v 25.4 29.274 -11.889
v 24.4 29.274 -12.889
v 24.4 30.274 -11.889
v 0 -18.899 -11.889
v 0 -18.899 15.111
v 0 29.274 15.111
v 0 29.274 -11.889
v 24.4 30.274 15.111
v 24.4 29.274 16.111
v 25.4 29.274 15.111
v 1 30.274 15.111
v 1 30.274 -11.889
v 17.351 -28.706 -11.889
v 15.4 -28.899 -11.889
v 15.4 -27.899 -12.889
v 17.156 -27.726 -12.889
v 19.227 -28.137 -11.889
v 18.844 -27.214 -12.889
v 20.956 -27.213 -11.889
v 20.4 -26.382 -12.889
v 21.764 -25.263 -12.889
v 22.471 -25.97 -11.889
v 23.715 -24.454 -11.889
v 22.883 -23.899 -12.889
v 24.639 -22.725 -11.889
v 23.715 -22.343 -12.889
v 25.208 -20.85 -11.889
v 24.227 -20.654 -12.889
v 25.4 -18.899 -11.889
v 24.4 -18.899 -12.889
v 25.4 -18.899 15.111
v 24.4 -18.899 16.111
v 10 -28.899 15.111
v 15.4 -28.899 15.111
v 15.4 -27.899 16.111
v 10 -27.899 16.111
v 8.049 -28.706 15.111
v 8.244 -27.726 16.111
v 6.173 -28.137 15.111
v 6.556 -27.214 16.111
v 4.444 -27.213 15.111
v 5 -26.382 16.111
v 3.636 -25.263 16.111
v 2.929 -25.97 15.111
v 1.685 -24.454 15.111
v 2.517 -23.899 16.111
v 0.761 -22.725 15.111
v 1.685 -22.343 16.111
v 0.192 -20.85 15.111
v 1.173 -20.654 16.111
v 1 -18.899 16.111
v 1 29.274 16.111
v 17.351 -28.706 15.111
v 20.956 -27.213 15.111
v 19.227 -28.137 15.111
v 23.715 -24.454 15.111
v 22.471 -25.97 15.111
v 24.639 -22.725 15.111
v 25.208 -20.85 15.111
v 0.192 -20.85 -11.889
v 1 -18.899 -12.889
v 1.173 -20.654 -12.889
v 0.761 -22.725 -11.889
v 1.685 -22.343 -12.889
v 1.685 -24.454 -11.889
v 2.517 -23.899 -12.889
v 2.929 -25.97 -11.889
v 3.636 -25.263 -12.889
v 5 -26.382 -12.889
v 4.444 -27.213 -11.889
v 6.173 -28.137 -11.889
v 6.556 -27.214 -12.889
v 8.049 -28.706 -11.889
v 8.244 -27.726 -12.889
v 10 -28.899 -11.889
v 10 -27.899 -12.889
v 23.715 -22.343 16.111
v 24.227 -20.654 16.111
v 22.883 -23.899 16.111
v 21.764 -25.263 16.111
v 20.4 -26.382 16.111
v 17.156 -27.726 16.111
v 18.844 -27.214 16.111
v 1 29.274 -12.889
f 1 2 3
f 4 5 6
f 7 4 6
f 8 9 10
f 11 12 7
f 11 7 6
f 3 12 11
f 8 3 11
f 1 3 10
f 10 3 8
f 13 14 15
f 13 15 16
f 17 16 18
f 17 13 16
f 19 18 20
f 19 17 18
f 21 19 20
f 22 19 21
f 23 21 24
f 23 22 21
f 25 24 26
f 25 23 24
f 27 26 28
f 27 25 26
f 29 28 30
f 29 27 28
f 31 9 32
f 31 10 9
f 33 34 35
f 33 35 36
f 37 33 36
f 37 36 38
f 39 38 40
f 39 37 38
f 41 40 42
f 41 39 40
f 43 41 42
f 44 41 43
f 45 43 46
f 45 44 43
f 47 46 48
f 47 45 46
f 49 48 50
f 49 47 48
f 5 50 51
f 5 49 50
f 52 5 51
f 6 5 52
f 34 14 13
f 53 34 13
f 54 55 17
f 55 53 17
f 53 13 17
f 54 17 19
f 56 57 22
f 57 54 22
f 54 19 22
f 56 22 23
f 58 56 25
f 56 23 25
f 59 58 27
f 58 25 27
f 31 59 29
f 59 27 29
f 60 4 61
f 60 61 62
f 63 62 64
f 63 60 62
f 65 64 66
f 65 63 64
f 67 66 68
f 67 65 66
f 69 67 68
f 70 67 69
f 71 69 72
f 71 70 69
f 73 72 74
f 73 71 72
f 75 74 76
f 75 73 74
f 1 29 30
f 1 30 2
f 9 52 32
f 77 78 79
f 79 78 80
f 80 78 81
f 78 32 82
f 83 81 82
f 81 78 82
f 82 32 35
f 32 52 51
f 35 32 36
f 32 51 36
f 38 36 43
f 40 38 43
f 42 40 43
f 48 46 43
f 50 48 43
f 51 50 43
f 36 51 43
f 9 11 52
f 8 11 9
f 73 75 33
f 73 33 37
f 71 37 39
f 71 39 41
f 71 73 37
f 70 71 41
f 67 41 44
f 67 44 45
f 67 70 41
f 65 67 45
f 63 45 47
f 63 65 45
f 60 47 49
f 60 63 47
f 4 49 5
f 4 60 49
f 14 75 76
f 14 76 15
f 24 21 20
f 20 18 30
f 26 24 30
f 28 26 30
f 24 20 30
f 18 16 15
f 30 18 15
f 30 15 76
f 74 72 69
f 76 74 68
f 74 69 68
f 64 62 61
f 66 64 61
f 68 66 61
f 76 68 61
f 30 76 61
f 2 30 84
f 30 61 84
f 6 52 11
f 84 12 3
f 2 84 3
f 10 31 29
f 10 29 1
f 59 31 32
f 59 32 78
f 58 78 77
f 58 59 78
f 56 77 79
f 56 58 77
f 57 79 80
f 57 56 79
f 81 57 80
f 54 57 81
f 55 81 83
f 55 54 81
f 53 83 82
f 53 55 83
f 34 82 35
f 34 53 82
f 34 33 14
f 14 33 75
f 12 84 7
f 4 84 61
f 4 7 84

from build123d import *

# Parameters (mm, degrees)
F0_W     = 44.5
F0_H     = 29
F1_DEPTH = 25.4
F2_R     = 10
F3_SIZE  = 1


with BuildPart() as f1:
    # F0 (on Right) → F1 (new body)
    with BuildSketch(Plane.YZ):
        with BuildLine():
            ThreePointArc((-27.7348309755, -3.6565796257), (-28.7256107674, 1.6113392583), (-27.7348309755, 6.8792581423))
            Line((-27.7348309755, 6.8792581423), (-27.7348309755, 16.1113392583))
            Line((-27.7348309755, 16.1113392583), (-28.8986135274, 16.1113392583))
            Line((-28.8986135274, 16.1113392583), (-28.8986135274, -12.8886607417))
            Line((-28.8986135274, -12.8886607417), (-27.7348309755, -12.8886607417))
            Line((-27.7348309755, -12.8886607417), (-27.7348309755, -3.6565796257))
        make_face()
        with BuildLine():
            ThreePointArc((-27.7348309755, 6.8792581423), (-22.4068446652, 13.5828643035), (-14.2256107674, 16.1113392583))
            Line((-14.2256107674, 16.1113392583), (-27.7348309755, 16.1113392583))
            Line((-27.7348309755, 16.1113392583), (-27.7348309755, 6.8792581423))
        make_face()
        with BuildLine():
            Line((-27.7348309755, -12.8886607417), (-14.2256107674, -12.8886607417))
            ThreePointArc((-14.2256107674, -12.8886607417), (-22.4068446652, -10.360185787), (-27.7348309755, -3.6565796257))
            Line((-27.7348309755, -3.6565796257), (-27.7348309755, -12.8886607417))
        make_face()
        with BuildLine():
            Line((-14.2256107674, -12.8886607417), (-14.2256107674, 16.1113392583))
            ThreePointArc((-14.2256107674, 16.1113392583), (-22.4068446652, 13.5828643035), (-27.7348309755, 6.8792581423))
            Line((-27.7348309755, 6.8792581423), (-27.7348309755, -3.6565796257))
            ThreePointArc((-27.7348309755, -3.6565796257), (-22.4068446652, -10.360185787), (-14.2256107674, -12.8886607417))
        make_face()
        with BuildLine():
            Line((-27.7348309755, -3.6565796257), (-27.7348309755, 6.8792581423))
            ThreePointArc((-27.7348309755, 6.8792581423), (-28.7256107674, 1.6113392583), (-27.7348309755, -3.6565796257))
        make_face()
        with Locations((8.0243892326, 1.6113392583)):
            Rectangle(F0_W, F0_H)
    extrude(amount=F1_DEPTH)

    # F2
    f2_edges = [f1.edges().sort_by_distance(p)[0] for p in [
        (25.4, -28.898614, 1.611339),
        (0, -28.898614, 1.611339),
    ]]
    fillet(f2_edges, radius=F2_R)

    # F3
    f3_edges = [f1.edges().sort_by_distance(p)[0] for p in [
        (25.4, 5.687888, 16.111339),
        (25.4, 5.687888, -12.888661),
        (12.7, 30.274389, 16.111339),
        (12.7, 30.274389, -12.888661),
        (25.4, 30.274389, 1.611339),
        (0, 30.274389, 1.611339),
    ]]
    chamfer(f3_edges, length=F3_SIZE)


solid = f1.part
